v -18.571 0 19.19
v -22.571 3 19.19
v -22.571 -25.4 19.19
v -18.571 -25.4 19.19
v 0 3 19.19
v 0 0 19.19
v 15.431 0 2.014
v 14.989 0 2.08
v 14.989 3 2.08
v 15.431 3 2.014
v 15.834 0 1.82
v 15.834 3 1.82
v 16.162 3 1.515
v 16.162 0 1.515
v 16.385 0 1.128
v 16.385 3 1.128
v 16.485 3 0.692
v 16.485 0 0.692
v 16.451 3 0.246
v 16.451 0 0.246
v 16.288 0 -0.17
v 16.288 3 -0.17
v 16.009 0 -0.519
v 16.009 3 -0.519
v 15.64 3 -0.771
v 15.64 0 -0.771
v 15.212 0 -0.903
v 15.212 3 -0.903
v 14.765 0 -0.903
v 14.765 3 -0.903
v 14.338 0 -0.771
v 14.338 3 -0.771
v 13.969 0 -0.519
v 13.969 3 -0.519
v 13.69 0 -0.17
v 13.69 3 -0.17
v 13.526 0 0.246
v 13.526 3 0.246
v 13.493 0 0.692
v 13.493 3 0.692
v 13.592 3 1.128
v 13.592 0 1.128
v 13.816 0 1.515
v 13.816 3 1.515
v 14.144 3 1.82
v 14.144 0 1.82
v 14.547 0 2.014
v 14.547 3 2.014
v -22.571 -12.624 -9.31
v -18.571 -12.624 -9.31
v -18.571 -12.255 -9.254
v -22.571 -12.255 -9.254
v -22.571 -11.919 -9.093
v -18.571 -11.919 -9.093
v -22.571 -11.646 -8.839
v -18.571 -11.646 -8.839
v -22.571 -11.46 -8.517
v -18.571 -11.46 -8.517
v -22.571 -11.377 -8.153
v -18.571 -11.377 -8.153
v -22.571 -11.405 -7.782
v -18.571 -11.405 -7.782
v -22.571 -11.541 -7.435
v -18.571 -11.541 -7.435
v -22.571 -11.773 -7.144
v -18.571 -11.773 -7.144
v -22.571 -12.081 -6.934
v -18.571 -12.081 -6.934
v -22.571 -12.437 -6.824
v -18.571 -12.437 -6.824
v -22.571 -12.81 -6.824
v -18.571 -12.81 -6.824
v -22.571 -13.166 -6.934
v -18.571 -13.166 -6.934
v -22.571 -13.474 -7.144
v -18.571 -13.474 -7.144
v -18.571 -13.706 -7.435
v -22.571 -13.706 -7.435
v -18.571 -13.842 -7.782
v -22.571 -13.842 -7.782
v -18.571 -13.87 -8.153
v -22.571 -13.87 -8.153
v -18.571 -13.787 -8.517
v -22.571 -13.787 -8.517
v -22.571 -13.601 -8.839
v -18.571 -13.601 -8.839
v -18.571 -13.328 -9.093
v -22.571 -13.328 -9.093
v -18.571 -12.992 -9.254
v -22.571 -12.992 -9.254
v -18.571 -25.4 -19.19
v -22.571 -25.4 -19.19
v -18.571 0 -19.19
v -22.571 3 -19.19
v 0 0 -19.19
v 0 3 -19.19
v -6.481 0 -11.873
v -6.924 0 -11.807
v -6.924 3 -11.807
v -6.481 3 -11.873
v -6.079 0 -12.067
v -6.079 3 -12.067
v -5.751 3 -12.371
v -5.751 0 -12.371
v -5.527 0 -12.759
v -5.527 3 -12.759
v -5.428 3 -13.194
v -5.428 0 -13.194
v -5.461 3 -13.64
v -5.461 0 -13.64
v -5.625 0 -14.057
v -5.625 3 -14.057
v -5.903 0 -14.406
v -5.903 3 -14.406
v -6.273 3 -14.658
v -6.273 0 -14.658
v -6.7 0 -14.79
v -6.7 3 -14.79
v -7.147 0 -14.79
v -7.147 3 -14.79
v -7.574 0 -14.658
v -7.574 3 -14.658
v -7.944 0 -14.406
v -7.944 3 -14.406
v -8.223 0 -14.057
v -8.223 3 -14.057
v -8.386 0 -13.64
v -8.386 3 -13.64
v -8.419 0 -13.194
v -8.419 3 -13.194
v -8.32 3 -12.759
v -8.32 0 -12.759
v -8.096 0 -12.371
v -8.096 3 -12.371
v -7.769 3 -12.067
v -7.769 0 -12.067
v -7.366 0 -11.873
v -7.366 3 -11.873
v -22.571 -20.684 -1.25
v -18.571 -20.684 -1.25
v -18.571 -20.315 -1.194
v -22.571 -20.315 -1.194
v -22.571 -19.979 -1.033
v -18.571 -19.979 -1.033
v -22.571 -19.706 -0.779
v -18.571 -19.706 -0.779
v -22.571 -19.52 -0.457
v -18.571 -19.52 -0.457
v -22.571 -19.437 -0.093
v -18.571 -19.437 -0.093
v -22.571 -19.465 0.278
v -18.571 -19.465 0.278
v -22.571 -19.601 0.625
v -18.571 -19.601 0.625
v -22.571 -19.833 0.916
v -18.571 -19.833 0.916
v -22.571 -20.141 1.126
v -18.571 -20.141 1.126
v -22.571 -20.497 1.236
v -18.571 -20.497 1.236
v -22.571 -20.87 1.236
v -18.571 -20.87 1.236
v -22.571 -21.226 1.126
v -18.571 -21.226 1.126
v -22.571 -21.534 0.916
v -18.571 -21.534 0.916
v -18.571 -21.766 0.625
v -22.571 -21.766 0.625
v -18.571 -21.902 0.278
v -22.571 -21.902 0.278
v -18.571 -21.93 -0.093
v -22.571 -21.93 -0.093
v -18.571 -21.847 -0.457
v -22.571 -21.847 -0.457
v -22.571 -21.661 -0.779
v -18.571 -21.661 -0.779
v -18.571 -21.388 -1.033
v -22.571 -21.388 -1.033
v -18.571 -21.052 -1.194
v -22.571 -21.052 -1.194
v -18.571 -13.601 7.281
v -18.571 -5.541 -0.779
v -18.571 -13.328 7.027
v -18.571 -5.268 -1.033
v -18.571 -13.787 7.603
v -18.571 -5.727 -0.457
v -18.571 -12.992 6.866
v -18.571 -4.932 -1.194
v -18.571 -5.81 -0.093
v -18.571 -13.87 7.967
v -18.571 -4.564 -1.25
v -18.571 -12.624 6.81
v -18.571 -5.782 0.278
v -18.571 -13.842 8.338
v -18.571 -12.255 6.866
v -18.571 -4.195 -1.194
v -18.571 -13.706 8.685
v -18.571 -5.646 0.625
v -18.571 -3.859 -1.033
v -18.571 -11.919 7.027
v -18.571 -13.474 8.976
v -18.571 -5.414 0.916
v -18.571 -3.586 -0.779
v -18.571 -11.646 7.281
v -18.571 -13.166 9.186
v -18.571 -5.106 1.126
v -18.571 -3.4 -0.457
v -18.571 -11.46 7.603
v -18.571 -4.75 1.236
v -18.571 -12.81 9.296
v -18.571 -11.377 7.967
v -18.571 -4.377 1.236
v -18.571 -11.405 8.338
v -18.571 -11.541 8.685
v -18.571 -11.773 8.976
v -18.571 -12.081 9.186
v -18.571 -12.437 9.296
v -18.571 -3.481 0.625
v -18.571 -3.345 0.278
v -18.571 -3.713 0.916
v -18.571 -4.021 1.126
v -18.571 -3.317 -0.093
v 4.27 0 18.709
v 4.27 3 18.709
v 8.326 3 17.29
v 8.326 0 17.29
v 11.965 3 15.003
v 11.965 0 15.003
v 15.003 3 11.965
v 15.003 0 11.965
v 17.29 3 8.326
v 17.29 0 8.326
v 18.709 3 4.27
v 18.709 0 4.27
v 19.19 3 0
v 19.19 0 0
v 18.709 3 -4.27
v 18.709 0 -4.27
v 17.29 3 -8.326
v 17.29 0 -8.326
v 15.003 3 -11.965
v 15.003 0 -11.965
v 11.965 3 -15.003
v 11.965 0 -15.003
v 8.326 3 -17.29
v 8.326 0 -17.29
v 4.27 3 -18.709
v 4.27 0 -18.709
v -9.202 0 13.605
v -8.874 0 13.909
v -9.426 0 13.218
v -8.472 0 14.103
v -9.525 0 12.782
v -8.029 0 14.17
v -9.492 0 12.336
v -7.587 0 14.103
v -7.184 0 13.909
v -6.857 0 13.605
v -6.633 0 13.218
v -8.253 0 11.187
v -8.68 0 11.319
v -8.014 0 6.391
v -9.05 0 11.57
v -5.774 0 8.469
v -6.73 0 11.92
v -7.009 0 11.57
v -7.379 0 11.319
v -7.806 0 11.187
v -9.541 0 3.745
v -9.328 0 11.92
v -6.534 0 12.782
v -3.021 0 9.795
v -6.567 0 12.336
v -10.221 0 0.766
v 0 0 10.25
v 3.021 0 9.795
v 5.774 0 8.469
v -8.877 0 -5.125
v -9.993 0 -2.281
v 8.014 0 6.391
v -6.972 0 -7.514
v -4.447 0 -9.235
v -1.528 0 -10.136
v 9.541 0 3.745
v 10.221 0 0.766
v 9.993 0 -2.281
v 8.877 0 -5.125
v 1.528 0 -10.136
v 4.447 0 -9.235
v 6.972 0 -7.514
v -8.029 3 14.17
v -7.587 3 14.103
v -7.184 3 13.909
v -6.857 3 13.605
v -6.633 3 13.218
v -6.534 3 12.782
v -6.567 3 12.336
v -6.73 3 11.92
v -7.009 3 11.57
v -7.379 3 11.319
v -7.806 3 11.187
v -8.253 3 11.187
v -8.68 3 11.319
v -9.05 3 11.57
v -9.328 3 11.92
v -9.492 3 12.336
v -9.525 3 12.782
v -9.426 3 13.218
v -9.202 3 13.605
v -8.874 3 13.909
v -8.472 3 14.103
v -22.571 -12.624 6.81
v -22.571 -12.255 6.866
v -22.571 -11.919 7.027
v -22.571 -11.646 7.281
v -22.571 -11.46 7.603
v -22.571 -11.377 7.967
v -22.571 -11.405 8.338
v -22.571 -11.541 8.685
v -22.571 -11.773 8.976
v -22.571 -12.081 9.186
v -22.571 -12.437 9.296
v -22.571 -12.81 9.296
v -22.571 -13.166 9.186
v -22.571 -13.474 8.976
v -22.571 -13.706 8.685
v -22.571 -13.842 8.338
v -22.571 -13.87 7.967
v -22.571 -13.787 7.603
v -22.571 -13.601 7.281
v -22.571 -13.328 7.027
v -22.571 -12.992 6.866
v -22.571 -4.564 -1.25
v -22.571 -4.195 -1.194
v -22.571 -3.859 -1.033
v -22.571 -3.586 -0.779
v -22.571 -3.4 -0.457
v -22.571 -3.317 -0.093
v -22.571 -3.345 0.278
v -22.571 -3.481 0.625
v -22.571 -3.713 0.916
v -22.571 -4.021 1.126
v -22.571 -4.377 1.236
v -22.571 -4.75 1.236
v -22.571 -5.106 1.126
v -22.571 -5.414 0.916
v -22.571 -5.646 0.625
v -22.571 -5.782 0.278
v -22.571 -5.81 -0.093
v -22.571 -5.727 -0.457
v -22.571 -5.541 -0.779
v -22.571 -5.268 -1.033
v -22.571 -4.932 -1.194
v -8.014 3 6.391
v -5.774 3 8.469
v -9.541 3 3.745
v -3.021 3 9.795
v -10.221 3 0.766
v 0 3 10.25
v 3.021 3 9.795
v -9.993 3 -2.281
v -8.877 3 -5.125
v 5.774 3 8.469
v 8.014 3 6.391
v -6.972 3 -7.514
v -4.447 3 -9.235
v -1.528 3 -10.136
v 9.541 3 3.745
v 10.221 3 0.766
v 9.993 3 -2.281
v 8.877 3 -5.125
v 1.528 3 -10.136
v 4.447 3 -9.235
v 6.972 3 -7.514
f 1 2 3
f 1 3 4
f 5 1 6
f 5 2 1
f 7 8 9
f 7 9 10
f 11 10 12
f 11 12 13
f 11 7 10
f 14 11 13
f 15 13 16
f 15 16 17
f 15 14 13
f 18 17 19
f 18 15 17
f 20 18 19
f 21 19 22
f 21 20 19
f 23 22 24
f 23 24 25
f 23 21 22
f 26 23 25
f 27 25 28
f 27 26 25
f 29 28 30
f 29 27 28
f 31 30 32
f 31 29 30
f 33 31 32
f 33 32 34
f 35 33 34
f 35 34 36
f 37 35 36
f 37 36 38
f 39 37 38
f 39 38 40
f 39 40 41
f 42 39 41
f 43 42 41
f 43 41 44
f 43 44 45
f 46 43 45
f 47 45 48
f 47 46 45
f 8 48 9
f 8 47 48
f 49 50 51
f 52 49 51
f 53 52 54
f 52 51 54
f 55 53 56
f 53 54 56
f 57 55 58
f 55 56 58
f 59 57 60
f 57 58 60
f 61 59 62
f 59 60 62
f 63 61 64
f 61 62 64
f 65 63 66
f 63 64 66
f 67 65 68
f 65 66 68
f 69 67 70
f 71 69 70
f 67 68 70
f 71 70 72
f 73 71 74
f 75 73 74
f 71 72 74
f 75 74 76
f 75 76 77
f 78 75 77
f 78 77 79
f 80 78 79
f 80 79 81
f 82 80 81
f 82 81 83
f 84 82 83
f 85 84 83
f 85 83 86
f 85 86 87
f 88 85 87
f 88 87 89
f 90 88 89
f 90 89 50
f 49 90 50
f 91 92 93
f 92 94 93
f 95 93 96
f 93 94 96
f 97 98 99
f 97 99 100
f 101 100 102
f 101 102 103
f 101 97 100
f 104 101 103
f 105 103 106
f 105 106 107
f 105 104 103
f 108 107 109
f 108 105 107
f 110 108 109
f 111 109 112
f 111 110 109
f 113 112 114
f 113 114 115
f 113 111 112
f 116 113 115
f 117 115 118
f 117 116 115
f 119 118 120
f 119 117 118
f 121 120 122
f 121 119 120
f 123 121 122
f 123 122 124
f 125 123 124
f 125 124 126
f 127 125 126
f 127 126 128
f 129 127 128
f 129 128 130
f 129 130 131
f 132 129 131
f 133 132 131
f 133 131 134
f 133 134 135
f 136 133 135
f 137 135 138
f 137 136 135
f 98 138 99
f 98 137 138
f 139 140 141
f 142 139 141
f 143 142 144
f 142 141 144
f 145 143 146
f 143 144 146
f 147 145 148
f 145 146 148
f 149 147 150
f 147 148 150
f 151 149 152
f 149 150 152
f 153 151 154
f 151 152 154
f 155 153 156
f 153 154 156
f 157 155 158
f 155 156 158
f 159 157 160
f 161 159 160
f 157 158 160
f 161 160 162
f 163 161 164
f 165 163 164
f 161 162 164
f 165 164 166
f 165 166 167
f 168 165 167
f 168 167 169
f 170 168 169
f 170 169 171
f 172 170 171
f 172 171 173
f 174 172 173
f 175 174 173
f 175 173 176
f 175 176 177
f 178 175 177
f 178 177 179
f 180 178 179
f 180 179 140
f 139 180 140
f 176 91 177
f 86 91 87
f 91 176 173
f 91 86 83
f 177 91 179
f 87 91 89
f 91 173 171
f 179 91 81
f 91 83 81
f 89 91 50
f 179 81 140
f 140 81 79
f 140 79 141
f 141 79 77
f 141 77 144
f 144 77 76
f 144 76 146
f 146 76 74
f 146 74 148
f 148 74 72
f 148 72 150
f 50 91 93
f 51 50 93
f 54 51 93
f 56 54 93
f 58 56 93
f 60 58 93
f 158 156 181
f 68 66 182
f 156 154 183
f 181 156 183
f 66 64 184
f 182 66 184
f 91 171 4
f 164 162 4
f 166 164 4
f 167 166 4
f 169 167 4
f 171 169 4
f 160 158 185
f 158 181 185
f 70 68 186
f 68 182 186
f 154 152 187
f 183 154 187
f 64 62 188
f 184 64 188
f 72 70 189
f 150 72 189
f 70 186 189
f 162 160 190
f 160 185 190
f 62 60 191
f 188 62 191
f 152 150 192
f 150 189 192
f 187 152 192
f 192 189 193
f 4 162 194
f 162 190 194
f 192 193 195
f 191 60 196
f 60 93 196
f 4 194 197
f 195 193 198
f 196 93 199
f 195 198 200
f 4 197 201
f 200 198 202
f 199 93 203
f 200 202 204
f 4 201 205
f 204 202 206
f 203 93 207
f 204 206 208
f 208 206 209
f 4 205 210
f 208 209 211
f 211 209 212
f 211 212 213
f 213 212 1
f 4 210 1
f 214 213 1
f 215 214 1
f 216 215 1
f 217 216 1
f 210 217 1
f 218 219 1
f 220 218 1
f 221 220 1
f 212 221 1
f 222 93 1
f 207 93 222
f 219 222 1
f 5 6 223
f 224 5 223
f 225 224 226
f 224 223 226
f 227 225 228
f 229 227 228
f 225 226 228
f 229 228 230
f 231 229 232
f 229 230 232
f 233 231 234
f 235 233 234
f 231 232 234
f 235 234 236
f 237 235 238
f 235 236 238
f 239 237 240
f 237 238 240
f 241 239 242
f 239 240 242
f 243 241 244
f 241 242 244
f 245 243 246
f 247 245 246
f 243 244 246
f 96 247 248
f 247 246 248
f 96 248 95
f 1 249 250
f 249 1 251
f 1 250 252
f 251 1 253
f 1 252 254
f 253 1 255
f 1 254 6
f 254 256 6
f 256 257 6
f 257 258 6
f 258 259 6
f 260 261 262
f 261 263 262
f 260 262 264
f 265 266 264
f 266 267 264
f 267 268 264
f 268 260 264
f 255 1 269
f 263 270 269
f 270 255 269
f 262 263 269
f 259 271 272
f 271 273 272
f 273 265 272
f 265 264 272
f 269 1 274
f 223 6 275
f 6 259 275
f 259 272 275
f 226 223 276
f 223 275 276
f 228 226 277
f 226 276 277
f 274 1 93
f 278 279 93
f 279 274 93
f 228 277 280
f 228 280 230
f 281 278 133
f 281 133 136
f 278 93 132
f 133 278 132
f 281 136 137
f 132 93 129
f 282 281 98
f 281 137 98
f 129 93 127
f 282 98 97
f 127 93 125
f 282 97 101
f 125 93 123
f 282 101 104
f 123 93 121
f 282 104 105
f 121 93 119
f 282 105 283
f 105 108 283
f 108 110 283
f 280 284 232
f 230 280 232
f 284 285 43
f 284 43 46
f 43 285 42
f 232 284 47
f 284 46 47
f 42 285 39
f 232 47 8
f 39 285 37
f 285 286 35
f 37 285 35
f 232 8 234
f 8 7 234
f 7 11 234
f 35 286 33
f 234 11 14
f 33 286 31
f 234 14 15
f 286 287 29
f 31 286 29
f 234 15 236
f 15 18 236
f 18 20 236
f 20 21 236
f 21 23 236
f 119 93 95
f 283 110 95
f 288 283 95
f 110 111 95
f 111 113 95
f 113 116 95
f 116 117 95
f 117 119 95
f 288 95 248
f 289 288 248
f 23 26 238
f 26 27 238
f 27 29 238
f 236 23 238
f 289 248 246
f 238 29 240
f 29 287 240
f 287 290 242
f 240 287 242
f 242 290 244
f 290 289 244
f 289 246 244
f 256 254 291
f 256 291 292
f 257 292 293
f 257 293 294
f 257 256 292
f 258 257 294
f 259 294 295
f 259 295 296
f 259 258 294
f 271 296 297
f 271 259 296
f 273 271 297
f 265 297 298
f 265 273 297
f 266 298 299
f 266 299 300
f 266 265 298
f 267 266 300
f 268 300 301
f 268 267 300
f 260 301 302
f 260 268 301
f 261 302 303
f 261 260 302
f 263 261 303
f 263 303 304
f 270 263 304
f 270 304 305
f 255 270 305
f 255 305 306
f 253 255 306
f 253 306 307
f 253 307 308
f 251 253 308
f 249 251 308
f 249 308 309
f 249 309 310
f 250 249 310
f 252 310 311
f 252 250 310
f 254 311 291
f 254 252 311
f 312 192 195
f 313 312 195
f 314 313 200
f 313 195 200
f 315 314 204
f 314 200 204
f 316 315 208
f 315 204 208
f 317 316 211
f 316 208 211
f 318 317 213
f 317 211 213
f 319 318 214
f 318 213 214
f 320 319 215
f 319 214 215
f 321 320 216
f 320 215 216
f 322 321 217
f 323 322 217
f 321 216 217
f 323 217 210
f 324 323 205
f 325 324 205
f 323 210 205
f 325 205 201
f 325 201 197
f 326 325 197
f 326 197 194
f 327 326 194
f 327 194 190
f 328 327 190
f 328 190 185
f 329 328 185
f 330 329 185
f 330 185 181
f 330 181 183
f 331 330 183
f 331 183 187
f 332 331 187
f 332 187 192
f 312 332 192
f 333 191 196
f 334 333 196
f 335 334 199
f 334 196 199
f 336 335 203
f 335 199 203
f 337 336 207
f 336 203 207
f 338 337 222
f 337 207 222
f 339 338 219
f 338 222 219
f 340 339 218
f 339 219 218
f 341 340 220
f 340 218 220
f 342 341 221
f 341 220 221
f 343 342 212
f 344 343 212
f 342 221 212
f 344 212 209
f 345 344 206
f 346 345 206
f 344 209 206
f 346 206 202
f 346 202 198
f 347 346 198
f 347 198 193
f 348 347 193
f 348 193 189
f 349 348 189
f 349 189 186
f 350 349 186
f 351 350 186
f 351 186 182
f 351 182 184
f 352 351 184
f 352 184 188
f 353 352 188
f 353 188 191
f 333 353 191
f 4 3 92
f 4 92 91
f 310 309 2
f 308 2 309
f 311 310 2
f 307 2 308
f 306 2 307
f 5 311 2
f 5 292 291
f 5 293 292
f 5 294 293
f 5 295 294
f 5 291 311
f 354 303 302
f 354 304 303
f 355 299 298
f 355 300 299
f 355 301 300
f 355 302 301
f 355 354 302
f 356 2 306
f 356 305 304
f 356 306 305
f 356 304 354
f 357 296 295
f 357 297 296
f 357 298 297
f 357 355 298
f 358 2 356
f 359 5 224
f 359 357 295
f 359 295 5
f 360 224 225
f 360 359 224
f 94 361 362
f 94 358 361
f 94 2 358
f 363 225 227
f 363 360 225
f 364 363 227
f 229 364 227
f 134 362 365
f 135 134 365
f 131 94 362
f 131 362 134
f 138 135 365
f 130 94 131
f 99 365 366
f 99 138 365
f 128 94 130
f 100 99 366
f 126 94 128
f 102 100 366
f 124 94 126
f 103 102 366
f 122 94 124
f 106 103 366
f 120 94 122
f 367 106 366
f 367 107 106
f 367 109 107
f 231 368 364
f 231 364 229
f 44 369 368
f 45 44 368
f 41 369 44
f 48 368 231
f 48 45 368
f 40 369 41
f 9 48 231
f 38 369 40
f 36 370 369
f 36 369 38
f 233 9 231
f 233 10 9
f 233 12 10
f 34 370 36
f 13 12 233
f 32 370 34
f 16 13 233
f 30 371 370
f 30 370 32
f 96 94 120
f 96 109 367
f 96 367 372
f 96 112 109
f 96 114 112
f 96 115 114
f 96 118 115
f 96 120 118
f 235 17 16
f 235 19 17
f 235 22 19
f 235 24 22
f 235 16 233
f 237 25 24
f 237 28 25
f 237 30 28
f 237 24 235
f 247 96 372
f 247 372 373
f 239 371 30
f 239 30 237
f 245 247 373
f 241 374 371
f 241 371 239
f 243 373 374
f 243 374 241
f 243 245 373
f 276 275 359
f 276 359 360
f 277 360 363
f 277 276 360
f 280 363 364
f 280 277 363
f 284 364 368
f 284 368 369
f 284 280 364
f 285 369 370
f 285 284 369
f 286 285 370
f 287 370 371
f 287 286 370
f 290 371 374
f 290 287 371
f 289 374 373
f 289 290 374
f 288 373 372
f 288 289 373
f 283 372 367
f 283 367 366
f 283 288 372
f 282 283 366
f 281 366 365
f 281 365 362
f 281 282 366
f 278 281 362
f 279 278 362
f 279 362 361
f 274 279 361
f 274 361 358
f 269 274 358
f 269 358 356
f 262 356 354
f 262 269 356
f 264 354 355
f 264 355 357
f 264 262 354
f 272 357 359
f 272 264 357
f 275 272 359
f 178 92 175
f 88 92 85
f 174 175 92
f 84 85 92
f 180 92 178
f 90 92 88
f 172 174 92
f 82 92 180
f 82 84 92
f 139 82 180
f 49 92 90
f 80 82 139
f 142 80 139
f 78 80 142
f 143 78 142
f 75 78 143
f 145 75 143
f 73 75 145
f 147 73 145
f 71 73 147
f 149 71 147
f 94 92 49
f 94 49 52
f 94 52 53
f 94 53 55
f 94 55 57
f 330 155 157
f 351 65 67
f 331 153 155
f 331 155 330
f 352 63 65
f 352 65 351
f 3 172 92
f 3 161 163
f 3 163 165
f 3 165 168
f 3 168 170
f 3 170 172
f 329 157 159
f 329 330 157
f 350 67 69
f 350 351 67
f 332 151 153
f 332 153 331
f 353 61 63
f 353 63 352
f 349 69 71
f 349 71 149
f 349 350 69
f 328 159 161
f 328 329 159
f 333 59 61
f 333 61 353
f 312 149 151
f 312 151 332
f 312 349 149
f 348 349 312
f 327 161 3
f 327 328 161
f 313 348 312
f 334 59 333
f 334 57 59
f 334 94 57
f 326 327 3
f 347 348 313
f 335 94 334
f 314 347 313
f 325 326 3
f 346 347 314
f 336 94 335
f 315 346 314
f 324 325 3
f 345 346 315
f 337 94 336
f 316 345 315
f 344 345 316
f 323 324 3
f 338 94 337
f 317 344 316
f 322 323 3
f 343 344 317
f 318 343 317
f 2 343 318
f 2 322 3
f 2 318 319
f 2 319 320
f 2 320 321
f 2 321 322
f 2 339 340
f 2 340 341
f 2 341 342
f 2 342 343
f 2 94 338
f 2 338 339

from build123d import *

# Parameters (mm, degrees)
SKETCH1_R           = 10.25
SKETCH1_R_2         = 1.5
BOSS_EXTRUDE3_DEPTH = 3
SKETCH2_W           = 4
SKETCH2_H           = 38.38
BOSS_EXTRUDE4_DEPTH = 25.4
SKETCH3_R           = 1.25
CUT_EXTRUDE2_DEPTH  = 25.4


with BuildPart() as part:
    # Sketch1 → Boss-Extrude3 (new body)
    with BuildSketch(Plane(origin=(0, 0, 0), x_dir=(1, 0, 0), z_dir=(0, 1, 0))):
        with BuildLine():
            Line((-22.571326258, -19.19), (0, -19.19))
            ThreePointArc((0, -19.19), (19.19, 0), (0, 19.19))
            Line((0, 19.19), (-22.571326258, 19.19))
            Line((-22.571326258, 19.19), (-22.571326258, -19.19))
        make_face()
        with Locations(Location((0, 0, 0), (0, 0, 270))):
            Circle(SKETCH1_R, mode=Mode.SUBTRACT)
        with Locations(Location((-6.923626209, 13.306517204, 0), (0, 0, 270))):
            Circle(SKETCH1_R_2, mode=Mode.SUBTRACT)
        with Locations(Location((-8.029460065, -12.669955448, 0), (0, 0, 270))):
            Circle(SKETCH1_R_2, mode=Mode.SUBTRACT)
        with Locations(Location((14.988772764, -0.580250843, 0), (0, 0, 270))):
            Circle(SKETCH1_R_2, mode=Mode.SUBTRACT)
    extrude(amount=BOSS_EXTRUDE3_DEPTH)

    # Sketch2 → Boss-Extrude4 (add)
    with BuildSketch(Plane.XZ):
        with Locations((-20.571326258, 0)):
            Rectangle(SKETCH2_W, SKETCH2_H)
    extrude(amount=BOSS_EXTRUDE4_DEPTH)

    # Sketch3 → Cut-Extrude2 (cut)
    with BuildSketch(Plane(origin=(-18.571326258, 0, 0), x_dir=(0, 0, -1), z_dir=(1, 0, 0))):
        with Locations((0, -4.563544693)):
            Circle(SKETCH3_R)
        with Locations((-8.06, -12.623544693)):
            Circle(SKETCH3_R)
        with Locations((0, -20.683544693)):
            Circle(SKETCH3_R)
        with Locations((8.06, -12.623544693)):
            Circle(SKETCH3_R)
    extrude(amount=-CUT_EXTRUDE2_DEPTH, mode=Mode.SUBTRACT)


solid = part.part
